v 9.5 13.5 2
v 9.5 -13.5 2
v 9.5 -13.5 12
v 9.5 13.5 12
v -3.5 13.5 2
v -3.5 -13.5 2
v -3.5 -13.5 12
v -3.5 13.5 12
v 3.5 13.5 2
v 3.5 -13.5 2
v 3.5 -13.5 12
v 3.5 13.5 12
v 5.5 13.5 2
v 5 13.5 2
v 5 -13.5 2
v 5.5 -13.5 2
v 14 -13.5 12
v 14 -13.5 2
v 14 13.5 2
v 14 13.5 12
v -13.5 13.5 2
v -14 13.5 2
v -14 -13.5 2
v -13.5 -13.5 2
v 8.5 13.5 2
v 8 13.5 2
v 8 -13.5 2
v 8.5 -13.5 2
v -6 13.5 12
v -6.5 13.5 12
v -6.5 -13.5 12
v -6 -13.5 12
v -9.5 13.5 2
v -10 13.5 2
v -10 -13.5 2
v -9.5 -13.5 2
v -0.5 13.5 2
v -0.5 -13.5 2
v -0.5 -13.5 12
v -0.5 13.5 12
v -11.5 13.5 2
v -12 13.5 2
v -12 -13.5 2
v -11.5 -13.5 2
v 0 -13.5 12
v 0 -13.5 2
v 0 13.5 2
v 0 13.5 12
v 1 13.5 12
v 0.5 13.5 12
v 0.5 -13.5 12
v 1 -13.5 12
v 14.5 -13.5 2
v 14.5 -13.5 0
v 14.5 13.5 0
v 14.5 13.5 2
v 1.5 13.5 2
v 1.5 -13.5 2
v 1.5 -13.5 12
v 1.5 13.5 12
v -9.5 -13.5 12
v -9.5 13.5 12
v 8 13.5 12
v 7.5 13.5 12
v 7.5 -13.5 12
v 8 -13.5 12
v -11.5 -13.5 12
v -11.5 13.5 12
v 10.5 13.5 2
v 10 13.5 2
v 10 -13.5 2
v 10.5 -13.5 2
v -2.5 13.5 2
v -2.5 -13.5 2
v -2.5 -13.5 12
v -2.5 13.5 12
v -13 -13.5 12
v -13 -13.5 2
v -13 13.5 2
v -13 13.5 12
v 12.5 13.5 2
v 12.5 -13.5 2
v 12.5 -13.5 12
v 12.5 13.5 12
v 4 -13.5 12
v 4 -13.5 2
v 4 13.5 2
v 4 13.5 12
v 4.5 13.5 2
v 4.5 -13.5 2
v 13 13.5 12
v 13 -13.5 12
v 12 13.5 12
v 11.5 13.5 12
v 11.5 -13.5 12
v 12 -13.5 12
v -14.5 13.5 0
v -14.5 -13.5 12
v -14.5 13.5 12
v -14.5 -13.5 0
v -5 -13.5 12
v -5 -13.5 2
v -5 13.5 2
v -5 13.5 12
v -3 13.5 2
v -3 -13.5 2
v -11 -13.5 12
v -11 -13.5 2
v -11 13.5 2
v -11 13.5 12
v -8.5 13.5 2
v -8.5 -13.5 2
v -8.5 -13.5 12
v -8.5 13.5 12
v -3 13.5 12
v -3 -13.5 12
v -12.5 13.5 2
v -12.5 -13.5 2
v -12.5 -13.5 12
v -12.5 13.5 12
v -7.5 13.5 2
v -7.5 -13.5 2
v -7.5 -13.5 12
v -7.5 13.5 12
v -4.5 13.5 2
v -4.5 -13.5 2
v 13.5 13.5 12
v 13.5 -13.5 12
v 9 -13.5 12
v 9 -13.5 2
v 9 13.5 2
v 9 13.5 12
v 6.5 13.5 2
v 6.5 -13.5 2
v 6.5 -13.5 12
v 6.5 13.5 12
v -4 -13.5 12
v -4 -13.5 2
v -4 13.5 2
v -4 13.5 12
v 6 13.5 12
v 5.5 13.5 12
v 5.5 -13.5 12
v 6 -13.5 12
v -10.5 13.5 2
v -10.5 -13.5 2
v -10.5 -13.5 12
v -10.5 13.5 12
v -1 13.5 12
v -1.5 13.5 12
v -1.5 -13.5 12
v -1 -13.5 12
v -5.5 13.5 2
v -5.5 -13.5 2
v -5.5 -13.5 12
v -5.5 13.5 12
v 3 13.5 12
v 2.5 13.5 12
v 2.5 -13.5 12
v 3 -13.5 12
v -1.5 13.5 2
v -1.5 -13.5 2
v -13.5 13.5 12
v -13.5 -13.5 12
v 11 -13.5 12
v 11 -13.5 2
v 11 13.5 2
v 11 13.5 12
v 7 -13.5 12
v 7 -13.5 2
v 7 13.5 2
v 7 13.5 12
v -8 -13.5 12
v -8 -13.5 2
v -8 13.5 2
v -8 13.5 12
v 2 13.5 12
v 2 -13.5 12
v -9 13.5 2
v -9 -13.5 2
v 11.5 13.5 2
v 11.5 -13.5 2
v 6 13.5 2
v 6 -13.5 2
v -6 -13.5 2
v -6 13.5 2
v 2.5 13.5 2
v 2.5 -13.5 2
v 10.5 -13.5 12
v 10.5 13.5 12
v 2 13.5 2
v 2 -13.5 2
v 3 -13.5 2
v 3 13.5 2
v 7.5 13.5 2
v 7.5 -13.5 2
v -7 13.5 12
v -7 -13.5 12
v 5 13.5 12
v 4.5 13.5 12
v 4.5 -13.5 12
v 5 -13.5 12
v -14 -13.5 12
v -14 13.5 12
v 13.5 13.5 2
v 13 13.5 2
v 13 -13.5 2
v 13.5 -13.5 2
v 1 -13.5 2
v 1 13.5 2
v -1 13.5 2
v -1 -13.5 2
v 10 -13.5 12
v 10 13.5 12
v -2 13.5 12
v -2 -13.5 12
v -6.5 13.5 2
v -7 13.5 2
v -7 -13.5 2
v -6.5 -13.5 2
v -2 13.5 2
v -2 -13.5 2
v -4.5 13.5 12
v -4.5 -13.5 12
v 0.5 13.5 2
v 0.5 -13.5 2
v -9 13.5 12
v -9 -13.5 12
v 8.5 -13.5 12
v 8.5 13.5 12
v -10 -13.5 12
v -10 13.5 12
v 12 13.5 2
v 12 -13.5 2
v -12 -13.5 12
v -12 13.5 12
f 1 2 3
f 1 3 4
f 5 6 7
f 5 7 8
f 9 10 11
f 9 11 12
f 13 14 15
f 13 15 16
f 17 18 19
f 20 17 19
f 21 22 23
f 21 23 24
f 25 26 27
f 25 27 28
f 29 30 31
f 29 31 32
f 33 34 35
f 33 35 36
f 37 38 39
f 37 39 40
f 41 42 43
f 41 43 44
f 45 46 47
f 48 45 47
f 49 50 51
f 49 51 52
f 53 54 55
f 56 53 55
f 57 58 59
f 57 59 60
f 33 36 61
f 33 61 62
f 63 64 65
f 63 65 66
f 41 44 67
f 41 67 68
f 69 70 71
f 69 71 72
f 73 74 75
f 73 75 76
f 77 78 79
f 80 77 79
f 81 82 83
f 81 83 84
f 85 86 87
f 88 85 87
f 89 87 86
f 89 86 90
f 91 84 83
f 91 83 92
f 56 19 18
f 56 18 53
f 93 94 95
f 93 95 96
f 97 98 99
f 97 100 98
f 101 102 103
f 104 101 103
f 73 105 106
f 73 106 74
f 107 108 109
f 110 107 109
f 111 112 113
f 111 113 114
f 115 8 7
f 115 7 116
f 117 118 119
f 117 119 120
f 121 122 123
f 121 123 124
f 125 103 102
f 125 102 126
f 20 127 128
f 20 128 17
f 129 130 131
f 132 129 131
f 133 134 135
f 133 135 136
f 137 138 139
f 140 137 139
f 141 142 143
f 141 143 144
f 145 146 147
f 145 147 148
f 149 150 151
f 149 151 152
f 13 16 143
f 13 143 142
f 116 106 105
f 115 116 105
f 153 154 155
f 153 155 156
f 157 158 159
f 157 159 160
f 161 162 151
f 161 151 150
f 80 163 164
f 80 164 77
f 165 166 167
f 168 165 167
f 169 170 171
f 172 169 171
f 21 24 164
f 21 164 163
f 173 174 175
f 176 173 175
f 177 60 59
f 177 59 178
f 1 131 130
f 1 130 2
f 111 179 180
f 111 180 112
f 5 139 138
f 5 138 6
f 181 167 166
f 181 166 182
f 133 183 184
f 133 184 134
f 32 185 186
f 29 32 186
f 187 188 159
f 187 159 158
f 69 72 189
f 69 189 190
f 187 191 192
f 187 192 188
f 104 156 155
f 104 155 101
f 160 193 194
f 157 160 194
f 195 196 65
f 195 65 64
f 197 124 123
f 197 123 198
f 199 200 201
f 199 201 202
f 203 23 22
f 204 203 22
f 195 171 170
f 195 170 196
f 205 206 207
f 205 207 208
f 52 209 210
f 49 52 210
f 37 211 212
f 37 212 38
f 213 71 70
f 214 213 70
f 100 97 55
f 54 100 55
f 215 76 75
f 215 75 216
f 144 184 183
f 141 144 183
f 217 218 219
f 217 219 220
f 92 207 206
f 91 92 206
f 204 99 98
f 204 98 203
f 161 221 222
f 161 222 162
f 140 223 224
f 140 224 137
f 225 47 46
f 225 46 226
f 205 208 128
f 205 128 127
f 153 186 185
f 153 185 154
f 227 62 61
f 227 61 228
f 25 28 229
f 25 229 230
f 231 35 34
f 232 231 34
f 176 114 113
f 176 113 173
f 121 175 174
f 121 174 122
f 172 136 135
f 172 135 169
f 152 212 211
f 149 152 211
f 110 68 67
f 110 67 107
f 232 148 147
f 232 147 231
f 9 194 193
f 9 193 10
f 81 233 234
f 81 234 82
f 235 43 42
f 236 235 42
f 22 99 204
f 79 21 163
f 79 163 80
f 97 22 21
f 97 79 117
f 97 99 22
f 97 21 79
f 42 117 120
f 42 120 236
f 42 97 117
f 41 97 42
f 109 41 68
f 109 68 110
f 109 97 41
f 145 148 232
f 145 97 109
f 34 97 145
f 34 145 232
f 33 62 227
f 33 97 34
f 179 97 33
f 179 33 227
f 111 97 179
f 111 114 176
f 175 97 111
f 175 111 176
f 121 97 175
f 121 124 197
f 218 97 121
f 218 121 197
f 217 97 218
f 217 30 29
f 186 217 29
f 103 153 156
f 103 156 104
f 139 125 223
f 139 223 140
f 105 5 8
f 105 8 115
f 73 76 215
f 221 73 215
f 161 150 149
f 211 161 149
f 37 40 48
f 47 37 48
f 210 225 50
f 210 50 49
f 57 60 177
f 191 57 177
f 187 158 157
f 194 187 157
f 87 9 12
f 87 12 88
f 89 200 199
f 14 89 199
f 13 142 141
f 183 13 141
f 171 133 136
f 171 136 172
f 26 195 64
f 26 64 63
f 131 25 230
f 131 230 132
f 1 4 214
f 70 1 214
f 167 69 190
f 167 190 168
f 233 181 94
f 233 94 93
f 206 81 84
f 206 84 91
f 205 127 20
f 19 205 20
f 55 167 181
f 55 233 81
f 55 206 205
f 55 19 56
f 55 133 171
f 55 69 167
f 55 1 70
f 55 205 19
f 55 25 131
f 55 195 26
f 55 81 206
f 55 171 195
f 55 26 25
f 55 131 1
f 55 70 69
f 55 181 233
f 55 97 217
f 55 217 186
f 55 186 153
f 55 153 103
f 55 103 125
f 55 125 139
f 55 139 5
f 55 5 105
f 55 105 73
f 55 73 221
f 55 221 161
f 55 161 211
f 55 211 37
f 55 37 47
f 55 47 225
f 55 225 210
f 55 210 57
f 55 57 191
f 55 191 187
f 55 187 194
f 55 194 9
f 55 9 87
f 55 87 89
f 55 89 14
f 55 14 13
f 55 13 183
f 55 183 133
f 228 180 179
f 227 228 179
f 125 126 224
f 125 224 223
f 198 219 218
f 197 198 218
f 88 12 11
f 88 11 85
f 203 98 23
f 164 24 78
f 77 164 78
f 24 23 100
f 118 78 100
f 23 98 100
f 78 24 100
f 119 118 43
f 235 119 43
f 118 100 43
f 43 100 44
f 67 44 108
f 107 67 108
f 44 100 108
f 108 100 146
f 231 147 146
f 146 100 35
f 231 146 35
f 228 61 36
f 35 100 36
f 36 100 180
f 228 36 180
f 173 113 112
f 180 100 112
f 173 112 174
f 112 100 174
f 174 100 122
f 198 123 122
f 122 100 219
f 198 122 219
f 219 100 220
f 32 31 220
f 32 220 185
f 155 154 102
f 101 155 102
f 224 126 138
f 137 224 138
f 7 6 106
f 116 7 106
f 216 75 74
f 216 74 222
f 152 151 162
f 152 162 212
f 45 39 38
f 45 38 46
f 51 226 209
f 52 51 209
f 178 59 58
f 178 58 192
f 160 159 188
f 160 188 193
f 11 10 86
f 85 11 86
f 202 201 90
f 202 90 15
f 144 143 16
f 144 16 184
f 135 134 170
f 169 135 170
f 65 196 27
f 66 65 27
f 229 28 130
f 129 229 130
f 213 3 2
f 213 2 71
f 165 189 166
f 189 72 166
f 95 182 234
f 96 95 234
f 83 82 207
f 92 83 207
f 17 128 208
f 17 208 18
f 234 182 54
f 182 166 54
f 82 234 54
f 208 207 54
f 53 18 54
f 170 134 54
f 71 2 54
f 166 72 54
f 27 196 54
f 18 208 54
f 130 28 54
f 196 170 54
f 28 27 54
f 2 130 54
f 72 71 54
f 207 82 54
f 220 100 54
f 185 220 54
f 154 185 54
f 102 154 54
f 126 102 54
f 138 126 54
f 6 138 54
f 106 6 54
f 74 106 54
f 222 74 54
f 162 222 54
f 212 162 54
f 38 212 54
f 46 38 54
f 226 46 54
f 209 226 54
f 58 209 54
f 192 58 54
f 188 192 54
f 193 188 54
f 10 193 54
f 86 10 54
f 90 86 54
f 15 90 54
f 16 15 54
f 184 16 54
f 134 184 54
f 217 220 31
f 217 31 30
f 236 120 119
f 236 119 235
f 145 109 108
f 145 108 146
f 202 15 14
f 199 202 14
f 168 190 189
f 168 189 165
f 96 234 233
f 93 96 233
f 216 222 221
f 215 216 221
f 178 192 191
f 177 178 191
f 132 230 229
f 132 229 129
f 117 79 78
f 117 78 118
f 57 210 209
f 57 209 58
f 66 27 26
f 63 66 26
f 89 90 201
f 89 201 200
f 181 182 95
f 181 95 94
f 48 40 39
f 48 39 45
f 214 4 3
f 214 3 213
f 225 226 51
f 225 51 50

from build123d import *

# Parameters (mm, degrees)
F0_W     = 29
F0_H     = 27
F1_DEPTH = 2
F2_W     = 0.5
F2_H     = 27
F3_DEPTH = 10


with BuildPart() as f1:
    # F0 (on Top) → F1 (new body)
    with BuildSketch(Plane.XY):
        Rectangle(F0_W, F0_H)
    extrude(amount=F1_DEPTH)

    # F2 (on face) → F3 (join)
    with BuildSketch(Plane.XY.offset(2)):
        with Locations((-14.25, 0)):
            Rectangle(F2_W, F2_H)
        with Locations((-13.25, 0)):
            Rectangle(F2_W, F2_H)
        with Locations((-12.25, 0)):
            Rectangle(F2_W, F2_H)
        with Locations((-11.25, 0)):
            Rectangle(F2_W, F2_H)
        with Locations((-10.25, 0)):
            Rectangle(F2_W, F2_H)
        with Locations((-9.25, 0)):
            Rectangle(F2_W, F2_H)
        with Locations((-8.25, 0)):
            Rectangle(F2_W, F2_H)
        with Locations((-7.25, 0)):
            Rectangle(F2_W, F2_H)
        with Locations((-6.25, 0)):
            Rectangle(F2_W, F2_H)
        with Locations((-5.25, 0)):
            Rectangle(F2_W, F2_H)
        with Locations((-4.25, 0)):
            Rectangle(F2_W, F2_H)
        with Locations((-3.25, 0)):
            Rectangle(F2_W, F2_H)
        with Locations((-2.25, 0)):
            Rectangle(F2_W, F2_H)
        with Locations((-1.25, 0)):
            Rectangle(F2_W, F2_H)
        with Locations((-0.25, 0)):
            Rectangle(F2_W, F2_H)
        with Locations((0.75, 0)):
            Rectangle(F2_W, F2_H)
        with Locations((1.75, 0)):
            Rectangle(F2_W, F2_H)
        with Locations((2.75, 0)):
            Rectangle(F2_W, F2_H)
        with Locations((3.75, 0)):
            Rectangle(F2_W, F2_H)
        with Locations((4.75, 0)):
            Rectangle(F2_W, F2_H)
        with Locations((5.75, 0)):
            Rectangle(F2_W, F2_H)
        with Locations((6.75, 0)):
            Rectangle(F2_W, F2_H)
        with Locations((7.75, 0)):
            Rectangle(F2_W, F2_H)
        with Locations((8.75, 0)):
            Rectangle(F2_W, F2_H)
        with Locations((9.75, 0)):
            Rectangle(F2_W, F2_H)
        with Locations((10.75, 0)):
            Rectangle(F2_W, F2_H)
        with Locations((11.75, 0)):
            Rectangle(F2_W, F2_H)
        with Locations((12.75, 0)):
            Rectangle(F2_W, F2_H)
        with Locations((13.75, 0)):
            Rectangle(F2_W, F2_H)
    extrude(amount=F3_DEPTH)


solid = f1.part
